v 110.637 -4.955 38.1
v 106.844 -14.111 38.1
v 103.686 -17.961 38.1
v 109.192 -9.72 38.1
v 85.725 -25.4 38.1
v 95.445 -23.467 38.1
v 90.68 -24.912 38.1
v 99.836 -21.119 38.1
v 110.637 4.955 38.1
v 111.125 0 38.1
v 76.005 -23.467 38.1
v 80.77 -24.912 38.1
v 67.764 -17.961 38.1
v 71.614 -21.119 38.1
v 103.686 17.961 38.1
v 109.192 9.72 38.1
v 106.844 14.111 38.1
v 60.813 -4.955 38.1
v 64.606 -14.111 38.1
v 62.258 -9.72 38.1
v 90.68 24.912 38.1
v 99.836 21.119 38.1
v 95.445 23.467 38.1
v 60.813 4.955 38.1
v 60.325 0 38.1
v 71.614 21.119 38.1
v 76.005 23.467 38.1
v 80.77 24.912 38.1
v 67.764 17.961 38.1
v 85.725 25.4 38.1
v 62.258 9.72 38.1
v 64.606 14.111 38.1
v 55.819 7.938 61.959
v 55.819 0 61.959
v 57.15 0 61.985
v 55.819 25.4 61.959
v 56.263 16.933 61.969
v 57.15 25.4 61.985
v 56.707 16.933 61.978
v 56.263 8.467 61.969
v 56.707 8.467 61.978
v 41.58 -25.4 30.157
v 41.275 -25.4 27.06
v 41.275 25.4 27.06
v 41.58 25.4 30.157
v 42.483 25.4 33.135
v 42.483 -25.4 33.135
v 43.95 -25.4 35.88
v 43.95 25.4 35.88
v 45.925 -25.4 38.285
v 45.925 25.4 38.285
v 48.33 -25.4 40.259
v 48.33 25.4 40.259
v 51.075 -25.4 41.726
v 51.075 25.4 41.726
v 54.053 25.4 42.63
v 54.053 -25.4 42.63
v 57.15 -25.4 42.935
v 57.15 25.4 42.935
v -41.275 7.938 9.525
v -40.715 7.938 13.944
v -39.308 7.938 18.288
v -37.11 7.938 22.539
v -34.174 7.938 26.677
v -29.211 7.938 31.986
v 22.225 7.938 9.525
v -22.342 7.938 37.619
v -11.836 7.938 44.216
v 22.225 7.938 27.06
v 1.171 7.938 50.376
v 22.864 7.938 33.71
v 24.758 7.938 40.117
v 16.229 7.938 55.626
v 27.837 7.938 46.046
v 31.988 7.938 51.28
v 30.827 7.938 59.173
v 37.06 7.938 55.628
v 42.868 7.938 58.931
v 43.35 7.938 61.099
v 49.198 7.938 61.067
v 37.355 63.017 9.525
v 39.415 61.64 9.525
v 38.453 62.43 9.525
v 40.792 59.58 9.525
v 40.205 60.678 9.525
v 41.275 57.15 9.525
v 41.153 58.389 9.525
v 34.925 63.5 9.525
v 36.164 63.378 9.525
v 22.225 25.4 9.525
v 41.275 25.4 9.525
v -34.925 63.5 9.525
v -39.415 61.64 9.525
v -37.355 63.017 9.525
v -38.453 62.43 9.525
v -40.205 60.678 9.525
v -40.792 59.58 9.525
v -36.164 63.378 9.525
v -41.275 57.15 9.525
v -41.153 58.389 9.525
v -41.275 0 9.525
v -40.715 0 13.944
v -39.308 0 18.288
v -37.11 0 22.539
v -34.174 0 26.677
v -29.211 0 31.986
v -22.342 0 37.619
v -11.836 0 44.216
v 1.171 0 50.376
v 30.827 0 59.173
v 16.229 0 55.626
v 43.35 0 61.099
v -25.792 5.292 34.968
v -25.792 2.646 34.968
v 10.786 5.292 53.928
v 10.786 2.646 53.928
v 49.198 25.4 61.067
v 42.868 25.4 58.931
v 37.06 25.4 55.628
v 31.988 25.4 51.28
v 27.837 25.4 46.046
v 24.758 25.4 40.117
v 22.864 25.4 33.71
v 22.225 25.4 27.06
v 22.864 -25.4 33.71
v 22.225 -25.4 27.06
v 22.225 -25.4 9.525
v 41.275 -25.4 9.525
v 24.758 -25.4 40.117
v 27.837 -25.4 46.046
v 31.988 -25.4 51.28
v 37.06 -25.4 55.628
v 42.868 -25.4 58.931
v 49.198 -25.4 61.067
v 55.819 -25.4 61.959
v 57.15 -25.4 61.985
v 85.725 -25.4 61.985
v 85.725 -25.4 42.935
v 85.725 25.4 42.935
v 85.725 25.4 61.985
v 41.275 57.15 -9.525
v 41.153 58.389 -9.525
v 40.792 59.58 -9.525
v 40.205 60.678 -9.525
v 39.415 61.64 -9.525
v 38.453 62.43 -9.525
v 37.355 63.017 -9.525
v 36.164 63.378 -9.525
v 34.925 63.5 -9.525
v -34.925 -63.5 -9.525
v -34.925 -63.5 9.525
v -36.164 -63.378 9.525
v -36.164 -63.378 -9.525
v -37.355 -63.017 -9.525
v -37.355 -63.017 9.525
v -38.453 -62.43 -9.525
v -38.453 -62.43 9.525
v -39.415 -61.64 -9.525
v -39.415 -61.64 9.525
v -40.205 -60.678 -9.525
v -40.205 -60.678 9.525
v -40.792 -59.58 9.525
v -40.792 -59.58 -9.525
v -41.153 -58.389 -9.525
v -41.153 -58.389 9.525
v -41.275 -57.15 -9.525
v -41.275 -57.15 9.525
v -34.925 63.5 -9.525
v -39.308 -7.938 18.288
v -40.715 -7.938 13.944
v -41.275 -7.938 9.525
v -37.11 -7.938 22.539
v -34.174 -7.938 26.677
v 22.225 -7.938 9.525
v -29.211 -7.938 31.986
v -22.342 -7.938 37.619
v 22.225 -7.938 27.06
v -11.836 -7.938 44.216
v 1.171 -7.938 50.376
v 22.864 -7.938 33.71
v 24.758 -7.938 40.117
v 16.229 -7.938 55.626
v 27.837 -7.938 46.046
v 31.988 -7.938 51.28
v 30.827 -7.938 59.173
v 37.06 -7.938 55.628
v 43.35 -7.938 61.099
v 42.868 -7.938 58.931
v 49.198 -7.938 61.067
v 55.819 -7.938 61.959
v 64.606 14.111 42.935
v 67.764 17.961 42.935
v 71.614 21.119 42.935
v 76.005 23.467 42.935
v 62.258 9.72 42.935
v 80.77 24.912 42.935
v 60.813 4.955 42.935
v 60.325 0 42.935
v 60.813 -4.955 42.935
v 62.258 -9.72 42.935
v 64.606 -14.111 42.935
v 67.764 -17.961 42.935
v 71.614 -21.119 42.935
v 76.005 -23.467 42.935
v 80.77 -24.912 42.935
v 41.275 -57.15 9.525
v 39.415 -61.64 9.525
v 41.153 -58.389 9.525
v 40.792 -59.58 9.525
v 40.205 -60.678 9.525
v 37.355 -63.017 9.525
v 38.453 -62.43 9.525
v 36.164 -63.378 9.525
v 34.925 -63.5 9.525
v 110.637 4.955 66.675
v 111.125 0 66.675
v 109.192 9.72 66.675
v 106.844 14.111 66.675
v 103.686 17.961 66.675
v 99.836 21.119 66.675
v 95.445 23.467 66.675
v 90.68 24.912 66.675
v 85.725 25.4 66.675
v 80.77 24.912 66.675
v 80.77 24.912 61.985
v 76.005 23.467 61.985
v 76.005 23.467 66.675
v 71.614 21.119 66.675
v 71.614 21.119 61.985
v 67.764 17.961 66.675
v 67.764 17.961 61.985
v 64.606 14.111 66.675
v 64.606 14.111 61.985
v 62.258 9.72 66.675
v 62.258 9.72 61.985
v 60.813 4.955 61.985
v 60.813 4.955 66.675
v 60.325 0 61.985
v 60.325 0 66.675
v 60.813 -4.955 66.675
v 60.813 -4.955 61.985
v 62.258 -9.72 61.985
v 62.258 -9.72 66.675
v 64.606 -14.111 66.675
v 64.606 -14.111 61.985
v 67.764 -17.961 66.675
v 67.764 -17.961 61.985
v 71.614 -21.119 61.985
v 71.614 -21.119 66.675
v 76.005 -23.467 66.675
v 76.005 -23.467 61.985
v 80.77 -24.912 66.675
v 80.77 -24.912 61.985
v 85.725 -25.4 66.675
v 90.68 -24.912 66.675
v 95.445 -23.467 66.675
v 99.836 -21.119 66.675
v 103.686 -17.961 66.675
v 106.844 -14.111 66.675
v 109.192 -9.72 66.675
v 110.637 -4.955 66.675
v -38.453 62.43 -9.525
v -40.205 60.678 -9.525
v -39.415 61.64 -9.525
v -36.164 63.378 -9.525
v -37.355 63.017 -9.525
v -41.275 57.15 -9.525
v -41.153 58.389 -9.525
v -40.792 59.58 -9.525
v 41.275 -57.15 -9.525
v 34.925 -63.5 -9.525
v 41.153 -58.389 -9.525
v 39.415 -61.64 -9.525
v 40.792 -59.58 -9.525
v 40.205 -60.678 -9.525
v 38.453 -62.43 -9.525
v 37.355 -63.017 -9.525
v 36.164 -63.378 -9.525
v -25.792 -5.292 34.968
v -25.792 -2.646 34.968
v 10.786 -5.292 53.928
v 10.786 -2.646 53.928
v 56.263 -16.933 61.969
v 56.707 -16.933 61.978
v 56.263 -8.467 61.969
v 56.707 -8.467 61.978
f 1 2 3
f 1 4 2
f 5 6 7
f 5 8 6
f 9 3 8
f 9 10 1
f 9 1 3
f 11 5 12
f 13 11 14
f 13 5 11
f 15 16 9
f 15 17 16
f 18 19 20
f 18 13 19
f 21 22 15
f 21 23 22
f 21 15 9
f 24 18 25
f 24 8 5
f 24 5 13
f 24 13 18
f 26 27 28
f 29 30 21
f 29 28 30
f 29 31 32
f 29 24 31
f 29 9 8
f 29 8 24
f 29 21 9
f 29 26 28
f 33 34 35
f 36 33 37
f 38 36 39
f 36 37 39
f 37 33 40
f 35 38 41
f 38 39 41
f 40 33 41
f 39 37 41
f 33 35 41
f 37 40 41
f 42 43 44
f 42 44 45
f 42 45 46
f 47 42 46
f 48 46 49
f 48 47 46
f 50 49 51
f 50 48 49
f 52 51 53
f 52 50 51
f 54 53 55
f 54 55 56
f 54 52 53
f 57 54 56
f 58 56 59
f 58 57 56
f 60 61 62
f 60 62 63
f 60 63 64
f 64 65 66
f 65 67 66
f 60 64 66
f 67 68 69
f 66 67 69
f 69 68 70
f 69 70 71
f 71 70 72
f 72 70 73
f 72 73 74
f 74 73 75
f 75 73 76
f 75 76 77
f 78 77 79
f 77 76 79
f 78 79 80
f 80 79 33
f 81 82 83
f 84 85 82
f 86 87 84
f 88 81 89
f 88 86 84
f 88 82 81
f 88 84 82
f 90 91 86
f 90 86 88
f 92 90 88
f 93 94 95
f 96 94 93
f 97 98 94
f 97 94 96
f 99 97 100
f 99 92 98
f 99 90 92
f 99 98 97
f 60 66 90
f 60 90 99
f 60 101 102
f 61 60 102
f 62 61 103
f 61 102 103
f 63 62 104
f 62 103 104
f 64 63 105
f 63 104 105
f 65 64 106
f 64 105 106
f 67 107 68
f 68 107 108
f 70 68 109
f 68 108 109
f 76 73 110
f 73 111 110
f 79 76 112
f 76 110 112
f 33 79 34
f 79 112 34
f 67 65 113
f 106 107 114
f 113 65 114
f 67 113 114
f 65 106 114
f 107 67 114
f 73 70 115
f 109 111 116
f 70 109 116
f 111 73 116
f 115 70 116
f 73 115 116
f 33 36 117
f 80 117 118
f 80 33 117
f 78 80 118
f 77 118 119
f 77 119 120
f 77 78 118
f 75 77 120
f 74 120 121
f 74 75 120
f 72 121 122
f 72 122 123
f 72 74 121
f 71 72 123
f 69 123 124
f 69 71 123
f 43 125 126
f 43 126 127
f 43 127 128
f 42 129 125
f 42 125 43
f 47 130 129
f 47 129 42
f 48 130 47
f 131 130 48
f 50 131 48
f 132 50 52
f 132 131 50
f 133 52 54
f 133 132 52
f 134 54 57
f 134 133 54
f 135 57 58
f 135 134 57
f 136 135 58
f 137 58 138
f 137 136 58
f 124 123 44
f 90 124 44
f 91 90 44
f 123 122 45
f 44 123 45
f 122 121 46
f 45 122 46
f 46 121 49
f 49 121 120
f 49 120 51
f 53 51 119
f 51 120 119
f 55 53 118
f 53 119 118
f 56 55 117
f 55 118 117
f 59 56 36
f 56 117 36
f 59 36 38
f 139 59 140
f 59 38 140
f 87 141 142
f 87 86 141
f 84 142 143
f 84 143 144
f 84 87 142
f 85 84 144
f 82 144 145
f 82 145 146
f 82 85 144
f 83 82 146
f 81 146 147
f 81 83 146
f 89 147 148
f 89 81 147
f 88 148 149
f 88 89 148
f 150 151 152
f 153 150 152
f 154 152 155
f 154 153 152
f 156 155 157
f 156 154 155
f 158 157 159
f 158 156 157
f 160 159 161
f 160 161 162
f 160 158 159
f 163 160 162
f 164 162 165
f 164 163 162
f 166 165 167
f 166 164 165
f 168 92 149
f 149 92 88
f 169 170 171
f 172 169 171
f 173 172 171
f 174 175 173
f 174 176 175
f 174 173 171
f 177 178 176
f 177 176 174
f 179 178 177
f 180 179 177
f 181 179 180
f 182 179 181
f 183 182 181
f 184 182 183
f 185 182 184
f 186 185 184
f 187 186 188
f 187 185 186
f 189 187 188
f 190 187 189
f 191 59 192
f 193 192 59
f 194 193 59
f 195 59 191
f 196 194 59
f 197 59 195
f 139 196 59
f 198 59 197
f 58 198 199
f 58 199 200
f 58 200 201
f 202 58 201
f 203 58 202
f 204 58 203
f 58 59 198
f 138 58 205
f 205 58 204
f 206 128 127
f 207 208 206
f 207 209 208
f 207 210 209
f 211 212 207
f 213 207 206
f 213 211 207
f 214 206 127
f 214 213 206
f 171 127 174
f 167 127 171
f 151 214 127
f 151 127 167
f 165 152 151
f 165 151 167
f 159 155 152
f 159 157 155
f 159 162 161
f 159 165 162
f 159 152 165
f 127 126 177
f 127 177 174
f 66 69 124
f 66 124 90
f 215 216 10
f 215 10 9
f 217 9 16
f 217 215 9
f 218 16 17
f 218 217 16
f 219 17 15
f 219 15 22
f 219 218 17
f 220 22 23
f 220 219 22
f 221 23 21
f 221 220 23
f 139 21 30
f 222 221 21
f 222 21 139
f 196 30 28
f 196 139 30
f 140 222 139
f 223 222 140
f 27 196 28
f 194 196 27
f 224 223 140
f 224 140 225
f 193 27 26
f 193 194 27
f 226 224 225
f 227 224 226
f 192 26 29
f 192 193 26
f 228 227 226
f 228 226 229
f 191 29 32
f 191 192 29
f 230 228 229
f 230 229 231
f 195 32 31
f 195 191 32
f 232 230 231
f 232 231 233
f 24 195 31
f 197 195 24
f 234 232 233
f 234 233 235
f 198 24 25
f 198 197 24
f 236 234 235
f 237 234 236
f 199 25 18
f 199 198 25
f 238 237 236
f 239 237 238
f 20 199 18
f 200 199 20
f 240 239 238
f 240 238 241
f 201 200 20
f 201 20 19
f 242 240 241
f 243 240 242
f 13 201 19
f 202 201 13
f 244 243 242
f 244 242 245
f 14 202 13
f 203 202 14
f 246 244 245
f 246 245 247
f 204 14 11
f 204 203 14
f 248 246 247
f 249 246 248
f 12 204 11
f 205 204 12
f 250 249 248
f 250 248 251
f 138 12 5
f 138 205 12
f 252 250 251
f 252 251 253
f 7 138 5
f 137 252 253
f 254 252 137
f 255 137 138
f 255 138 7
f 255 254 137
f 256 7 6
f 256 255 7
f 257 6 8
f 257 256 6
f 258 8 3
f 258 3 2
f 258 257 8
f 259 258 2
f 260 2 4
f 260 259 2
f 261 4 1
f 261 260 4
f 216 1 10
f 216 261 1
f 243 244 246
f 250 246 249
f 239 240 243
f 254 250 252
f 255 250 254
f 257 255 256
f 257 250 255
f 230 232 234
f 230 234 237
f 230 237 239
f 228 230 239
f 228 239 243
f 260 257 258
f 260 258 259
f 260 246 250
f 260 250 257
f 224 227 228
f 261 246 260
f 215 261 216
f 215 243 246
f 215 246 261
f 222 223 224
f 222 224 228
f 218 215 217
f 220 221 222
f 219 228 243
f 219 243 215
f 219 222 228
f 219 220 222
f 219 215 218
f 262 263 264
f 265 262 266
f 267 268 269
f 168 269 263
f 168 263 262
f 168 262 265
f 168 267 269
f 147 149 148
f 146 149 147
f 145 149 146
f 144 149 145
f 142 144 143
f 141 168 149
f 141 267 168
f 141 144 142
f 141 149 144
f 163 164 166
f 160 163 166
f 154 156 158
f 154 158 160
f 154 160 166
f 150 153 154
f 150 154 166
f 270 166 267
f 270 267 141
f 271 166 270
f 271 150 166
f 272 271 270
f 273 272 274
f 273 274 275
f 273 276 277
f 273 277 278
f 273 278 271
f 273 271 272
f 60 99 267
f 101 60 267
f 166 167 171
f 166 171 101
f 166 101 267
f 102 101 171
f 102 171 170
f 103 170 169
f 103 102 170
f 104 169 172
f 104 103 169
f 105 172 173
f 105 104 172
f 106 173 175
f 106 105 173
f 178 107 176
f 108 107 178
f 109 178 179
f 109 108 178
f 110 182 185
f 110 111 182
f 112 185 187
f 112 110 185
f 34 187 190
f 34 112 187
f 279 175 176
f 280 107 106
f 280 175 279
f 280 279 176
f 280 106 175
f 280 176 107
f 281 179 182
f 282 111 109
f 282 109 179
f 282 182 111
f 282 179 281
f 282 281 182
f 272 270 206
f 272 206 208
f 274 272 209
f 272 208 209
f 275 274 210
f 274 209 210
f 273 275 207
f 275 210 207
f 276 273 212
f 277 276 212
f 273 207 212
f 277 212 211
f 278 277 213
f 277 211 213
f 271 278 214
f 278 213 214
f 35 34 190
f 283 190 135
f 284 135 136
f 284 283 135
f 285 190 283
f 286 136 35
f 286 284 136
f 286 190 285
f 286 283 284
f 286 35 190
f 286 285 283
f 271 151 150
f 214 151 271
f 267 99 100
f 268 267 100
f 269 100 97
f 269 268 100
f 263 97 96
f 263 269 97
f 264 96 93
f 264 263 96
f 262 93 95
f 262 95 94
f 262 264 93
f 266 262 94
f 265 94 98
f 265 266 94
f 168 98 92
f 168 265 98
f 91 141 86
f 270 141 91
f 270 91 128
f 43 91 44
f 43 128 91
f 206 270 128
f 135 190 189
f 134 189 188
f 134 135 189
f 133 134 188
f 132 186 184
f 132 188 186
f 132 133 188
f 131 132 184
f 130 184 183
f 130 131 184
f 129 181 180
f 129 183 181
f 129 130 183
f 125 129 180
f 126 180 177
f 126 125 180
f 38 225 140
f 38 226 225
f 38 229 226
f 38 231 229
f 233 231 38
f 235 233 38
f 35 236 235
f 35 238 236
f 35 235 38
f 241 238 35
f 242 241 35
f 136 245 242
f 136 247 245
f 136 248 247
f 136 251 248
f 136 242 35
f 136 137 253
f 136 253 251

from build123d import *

# Parameters (mm, degrees)
F1_DEPTH = 63.5
F2_DEPTH = 25.4
F3_DEPTH = 7.9375
F5_R     = 6.35


# Not quite as in the source:
# - a feature names something its author has since deleted; it is built from what else it names


with BuildPart() as f1:
    # F0 (on Front) → F1 (new body, symmetric)
    with BuildSketch(Plane.XZ):
        Polygon((22.225, 9.525), (-41.275, 9.525), (-41.275, -9.525), (41.275, -9.525), (41.275, 9.525), align=None)
    extrude(amount=F1_DEPTH, both=True)

    # F0 (on Front) → F2 (join, symmetric)
    with BuildSketch(Plane.XZ):
        with BuildLine():
            Line((85.725, 61.9848461288), (60.325, 61.9848461288))
            Line((60.325, 61.9848461288), (57.15, 61.9848461288))
            add(Edge.make_bspline(
                [(55.8188394438, 61.9594684272), (56.2631889725, 61.9701778386), (56.7069273587, 61.9786434716), (57.15, 61.9848461288)],
                knots=[110.4431341751, 110.4431341751, 110.4431341751, 110.4431341751, 111.5325785628, 111.5325785628, 111.5325785628, 111.5325785628], degree=3))
            ThreePointArc((55.8188394438, 61.9594684272), (31.9880604143, 51.2803420215), (22.225, 27.0598461288))
            Line((22.225, 27.0598461288), (22.225, 9.525))
            Line((22.225, 9.525), (41.275, 9.525))
            Line((41.275, 9.525), (41.275, 27.0598461288))
            ThreePointArc((41.275, 27.0598461288), (45.9246798487, 38.2851662801), (57.15, 42.9348461288))
            Line((57.15, 42.9348461288), (60.325, 42.9348461288))
            Line((60.325, 42.9348461288), (85.725, 42.9348461288))
            Line((85.725, 42.9348461288), (85.725, 61.9848461288))
        make_face()
    extrude(amount=F2_DEPTH, both=True)

    # F0 (on Front) → F3 (join, symmetric)
    with BuildSketch(Plane.XZ):
        with BuildLine():
            ThreePointArc((22.225, 27.0598461288), (31.9880604143, 51.2803420215), (55.8188394438, 61.9594684272))
            add(Edge.make_bspline(
                [(-41.275, 9.525), (-40.5543307974, 36.728759834), (10.7726166473, 60.8737948733), (55.8188394438, 61.9594684272)],
                knots=[0, 0, 0, 0, 110.4431341751, 110.4431341751, 110.4431341751, 110.4431341751], degree=3))
            Line((-41.275, 9.525), (22.225, 9.525))
            Line((22.225, 9.525), (22.225, 27.0598461288))
        make_face()
    extrude(amount=F3_DEPTH, both=True)

    # F0 (on Front) → F4 (revolve)
    with BuildSketch(Plane.XZ):
        Polygon((111.125, 66.675), (85.725, 66.675), (85.725, 61.9848461288), (85.725, 42.9348461288), (85.725, 38.1), (111.125, 38.1), align=None)
    revolve(axis=Axis((85.725, 0, 52.3875), (0, 0, 1)))

    # F5
    f5_edges = [f1.edges().sort_by_distance(p)[0] for p in [
        (41.275, -63.5, 0),
        (-41.275, -63.5, 0),
        (-41.275, 63.5, 0),
        (41.275, 63.5, 0),
    ]]
    fillet(f5_edges, radius=F5_R)


solid = f1.part
